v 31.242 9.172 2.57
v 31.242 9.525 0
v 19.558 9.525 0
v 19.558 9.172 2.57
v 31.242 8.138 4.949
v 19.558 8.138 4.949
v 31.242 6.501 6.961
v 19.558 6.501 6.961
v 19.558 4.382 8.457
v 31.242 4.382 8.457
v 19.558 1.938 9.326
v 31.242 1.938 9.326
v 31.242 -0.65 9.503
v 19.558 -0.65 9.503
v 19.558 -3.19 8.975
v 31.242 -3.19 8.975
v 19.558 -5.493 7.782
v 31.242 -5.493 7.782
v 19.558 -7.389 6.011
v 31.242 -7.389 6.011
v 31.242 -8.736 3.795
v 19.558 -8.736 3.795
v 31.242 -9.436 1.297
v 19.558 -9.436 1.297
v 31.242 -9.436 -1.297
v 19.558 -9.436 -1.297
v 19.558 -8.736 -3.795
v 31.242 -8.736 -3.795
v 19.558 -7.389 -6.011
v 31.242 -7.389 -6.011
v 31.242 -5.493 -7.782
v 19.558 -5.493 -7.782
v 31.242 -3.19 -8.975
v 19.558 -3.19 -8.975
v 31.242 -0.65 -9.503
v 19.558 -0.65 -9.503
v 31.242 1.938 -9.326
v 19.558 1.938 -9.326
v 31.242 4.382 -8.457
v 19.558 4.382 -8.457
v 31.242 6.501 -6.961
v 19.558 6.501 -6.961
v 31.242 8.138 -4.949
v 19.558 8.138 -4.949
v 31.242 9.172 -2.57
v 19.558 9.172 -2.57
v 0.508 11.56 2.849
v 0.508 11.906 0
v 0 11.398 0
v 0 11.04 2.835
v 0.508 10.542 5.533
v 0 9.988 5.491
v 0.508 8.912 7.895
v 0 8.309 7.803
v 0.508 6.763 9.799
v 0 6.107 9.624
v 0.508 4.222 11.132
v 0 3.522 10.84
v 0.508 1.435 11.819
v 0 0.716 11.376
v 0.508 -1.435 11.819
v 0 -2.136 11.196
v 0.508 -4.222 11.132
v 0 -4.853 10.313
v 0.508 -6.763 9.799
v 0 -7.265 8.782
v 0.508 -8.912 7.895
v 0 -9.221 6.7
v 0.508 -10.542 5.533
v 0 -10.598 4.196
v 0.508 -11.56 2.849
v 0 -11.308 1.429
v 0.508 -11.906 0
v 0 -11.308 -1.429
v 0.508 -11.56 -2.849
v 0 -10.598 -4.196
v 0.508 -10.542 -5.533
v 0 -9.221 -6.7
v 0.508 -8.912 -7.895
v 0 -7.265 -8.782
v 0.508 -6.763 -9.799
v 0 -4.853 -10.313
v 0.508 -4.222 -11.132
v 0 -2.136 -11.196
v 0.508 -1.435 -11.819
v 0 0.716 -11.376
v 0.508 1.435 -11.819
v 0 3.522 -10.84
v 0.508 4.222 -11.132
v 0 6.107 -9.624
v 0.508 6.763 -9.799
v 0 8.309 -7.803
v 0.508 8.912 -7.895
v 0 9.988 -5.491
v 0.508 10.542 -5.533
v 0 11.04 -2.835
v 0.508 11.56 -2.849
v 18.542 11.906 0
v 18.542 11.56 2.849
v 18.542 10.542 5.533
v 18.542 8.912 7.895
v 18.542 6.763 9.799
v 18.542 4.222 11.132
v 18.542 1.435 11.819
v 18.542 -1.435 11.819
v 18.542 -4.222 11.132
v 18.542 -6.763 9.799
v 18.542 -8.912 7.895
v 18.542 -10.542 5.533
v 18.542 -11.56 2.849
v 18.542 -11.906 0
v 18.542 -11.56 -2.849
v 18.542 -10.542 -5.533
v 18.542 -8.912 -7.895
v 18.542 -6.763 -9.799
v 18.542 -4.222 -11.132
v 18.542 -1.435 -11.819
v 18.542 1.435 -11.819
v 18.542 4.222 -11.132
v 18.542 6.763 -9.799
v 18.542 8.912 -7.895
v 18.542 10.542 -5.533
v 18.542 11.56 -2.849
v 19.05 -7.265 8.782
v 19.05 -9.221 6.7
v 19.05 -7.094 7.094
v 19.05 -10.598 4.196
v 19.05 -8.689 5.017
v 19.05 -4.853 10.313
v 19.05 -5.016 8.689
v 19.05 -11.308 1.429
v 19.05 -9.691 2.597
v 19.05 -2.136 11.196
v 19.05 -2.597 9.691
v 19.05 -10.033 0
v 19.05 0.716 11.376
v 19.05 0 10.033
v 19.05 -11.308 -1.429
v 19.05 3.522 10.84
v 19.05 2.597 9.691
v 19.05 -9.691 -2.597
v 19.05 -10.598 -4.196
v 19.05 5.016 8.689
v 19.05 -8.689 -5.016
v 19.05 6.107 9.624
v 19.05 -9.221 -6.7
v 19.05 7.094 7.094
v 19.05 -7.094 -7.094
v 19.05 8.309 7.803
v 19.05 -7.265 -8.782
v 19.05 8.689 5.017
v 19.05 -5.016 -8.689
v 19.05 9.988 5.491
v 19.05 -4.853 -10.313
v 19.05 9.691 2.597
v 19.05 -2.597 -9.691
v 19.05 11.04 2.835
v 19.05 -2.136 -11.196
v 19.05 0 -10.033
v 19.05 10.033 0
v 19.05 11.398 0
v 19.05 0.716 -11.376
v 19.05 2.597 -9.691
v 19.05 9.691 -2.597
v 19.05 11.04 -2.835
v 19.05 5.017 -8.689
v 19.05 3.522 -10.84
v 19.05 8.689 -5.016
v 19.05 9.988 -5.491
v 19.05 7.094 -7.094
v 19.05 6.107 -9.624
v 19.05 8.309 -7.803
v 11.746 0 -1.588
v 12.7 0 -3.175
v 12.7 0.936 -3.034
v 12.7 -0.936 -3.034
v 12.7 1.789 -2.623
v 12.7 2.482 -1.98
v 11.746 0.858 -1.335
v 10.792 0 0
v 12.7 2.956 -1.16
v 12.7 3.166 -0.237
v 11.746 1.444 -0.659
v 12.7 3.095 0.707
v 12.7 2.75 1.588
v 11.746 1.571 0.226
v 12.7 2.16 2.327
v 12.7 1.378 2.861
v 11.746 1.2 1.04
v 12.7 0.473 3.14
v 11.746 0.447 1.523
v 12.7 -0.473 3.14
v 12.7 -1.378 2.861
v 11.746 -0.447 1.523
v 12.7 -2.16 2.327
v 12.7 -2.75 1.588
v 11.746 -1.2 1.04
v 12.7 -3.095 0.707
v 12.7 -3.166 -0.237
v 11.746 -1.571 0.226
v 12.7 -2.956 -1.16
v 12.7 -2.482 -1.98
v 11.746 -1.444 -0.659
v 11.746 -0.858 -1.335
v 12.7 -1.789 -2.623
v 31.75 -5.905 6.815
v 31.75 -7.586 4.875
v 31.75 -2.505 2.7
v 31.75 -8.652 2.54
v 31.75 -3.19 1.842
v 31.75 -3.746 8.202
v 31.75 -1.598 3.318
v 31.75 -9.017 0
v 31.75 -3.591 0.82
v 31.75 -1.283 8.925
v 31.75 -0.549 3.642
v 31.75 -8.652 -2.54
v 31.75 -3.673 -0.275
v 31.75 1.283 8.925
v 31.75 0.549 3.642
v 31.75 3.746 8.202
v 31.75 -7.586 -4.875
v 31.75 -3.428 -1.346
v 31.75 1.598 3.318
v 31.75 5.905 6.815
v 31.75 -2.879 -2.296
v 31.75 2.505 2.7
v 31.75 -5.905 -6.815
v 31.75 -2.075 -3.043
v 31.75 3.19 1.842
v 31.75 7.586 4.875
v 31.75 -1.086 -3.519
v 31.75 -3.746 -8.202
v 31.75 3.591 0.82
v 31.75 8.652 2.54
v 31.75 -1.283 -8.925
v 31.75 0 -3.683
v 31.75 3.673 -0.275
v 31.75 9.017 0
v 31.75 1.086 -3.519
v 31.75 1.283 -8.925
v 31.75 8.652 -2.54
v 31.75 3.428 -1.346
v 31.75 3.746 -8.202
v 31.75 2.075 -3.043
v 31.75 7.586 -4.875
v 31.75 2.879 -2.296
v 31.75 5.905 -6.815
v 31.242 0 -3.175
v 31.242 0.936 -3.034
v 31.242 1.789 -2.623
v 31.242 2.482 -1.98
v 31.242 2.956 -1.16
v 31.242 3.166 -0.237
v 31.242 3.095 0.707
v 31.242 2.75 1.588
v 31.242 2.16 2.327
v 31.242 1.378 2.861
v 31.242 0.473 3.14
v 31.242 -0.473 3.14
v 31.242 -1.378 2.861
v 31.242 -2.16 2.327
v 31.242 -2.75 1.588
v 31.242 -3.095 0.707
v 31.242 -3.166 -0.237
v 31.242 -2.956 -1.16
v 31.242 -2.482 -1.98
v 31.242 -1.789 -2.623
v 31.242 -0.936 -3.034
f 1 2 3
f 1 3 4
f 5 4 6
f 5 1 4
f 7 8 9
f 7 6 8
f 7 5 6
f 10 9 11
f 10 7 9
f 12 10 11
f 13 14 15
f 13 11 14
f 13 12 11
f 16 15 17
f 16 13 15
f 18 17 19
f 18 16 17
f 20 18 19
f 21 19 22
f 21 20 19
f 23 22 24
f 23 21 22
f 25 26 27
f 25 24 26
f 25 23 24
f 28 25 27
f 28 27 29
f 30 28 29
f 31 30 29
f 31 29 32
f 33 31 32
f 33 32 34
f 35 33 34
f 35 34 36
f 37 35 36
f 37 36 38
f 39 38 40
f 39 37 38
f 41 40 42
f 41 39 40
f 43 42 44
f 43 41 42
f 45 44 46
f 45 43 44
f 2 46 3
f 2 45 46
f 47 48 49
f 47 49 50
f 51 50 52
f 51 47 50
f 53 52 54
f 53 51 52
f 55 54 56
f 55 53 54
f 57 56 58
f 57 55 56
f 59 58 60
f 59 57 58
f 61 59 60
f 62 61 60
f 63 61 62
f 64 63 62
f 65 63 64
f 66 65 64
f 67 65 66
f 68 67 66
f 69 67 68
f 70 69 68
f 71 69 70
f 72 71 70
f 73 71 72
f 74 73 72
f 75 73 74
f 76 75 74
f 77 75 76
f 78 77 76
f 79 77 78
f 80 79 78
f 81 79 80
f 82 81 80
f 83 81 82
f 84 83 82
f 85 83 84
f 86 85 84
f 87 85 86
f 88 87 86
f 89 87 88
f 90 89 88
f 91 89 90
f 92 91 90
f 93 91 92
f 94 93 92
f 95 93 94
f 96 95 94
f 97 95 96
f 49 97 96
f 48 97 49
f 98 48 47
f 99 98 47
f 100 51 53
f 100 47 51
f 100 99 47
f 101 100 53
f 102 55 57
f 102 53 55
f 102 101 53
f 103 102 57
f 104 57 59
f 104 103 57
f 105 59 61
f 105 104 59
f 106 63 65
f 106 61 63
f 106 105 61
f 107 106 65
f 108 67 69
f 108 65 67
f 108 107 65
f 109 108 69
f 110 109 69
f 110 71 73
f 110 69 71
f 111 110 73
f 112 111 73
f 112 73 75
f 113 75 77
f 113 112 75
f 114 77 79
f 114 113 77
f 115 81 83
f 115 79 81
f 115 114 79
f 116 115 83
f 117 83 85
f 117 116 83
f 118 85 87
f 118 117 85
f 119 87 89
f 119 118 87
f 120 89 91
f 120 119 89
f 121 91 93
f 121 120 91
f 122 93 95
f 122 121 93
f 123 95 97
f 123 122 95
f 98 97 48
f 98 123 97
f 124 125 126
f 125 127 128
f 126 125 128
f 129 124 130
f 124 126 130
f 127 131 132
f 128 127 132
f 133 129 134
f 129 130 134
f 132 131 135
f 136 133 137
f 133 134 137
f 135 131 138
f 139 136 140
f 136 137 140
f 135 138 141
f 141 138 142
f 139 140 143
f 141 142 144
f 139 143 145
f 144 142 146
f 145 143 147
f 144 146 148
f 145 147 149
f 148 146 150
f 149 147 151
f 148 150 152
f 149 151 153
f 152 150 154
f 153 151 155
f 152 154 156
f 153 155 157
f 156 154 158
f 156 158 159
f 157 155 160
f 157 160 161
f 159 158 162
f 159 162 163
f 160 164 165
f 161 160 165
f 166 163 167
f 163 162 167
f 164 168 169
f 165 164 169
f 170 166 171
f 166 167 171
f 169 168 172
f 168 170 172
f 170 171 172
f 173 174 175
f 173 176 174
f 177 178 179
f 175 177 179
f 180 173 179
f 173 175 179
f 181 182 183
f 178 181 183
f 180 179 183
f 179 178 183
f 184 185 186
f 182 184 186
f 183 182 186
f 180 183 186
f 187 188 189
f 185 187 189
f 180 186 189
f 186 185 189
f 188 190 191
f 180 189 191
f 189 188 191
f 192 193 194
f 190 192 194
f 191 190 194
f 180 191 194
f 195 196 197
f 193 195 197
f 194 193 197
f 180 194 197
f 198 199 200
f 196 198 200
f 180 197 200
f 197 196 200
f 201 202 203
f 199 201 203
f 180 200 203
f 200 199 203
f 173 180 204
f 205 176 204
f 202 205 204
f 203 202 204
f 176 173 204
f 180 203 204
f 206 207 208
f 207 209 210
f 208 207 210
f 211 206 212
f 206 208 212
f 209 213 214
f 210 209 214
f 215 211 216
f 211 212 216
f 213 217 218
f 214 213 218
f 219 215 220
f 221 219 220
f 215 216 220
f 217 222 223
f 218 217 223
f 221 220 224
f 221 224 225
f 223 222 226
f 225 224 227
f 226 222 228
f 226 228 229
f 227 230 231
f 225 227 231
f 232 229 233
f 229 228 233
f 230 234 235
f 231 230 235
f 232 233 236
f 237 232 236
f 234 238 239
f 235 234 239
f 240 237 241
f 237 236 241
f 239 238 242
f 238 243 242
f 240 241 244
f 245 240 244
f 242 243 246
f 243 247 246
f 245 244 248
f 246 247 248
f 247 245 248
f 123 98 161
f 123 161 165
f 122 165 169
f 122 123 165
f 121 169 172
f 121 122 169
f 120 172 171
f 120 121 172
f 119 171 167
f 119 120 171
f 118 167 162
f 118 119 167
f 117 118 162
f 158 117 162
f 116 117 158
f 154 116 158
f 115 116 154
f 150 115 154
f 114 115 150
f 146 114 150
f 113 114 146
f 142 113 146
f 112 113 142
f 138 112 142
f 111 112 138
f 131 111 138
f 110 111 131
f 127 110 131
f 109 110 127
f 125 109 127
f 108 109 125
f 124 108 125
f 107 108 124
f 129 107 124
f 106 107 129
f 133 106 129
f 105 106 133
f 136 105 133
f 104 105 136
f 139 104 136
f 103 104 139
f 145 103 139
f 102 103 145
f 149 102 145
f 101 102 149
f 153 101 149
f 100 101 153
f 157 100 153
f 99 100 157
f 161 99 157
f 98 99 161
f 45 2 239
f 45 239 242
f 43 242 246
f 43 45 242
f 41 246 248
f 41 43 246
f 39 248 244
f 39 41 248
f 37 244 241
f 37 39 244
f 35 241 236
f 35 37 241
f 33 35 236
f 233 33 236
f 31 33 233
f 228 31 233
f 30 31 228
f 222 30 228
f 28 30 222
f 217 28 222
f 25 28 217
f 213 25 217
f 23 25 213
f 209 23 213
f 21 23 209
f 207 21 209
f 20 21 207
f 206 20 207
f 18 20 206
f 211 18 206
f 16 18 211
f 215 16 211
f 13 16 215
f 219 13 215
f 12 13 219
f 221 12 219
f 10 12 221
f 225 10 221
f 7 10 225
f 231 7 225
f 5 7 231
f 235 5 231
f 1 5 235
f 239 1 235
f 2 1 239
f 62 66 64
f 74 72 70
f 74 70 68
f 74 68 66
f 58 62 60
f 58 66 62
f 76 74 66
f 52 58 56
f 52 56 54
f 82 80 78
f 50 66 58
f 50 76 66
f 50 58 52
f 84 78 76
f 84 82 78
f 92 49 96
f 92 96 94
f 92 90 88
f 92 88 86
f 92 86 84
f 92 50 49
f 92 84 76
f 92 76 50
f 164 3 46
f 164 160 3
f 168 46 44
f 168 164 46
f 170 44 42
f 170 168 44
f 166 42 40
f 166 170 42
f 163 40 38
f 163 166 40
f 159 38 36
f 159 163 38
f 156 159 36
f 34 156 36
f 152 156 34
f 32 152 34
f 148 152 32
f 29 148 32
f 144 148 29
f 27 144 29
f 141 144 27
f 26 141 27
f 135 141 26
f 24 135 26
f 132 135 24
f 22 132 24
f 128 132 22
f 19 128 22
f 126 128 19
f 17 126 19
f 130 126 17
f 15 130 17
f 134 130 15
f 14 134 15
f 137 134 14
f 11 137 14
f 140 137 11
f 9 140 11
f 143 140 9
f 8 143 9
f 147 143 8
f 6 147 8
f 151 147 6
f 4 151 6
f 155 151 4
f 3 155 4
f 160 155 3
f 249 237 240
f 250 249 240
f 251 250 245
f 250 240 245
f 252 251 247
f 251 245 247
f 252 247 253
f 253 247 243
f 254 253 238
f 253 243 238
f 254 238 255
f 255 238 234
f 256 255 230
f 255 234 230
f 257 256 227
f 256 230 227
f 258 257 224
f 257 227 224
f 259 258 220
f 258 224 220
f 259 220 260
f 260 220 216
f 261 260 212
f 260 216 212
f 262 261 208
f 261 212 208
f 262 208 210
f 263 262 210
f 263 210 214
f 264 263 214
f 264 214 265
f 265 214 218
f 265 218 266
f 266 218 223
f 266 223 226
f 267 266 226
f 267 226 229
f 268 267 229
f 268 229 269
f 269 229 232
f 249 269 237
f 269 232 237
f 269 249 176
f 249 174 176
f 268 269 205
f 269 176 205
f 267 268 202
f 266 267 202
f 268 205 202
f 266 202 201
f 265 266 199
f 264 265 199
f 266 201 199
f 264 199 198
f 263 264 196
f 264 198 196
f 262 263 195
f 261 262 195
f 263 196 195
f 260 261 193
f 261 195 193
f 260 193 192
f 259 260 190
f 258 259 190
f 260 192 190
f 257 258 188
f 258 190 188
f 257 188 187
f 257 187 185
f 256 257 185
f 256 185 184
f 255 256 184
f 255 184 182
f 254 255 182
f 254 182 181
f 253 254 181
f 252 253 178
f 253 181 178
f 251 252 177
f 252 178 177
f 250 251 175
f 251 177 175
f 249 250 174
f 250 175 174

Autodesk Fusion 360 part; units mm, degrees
sketch "Sketch1" plane through (0, 0, 0) normal (0, 0, 1) x (1, 0, 0)
  line L0 (0, 0) -> (0, 11.9062)
  line L1 (0, 11.9062) -> (19.05, 11.9063)
  line L2 (19.05, 11.9063) -> (19.05, 9.525)
  line L3 (19.05, 9.525) -> (31.75, 9.525)
  line L4 (31.75, 9.525) -> (31.75, 0)
  line L5 (31.75, 0) -> (0, 0)
  dimension "d1" = 11.9062
  dimension "d2" = 9.525
  dimension "d3" = 12.7
  dimension "d4" = 19.05
revolve "Revolve1" add sketch "Sketch1" angle 360 about axis through (31.75, 0, 0) along (-1, 0, 0)
hole "Hole1" at (31.75, 0, 0) direction (-1, 0, 0) diameter 6.35 depth 19.05 tip angle 118
chamfer "Chamfer1" distance 0.508 angle 45 5 edges at (0, -4.3055, 11.1005) (19.05, -4.3055, 11.1005) (19.05, -3.4444, 8.8804) (31.75, -3.4444, 8.8804) (31.75, -2.9601, 1.1481)
equation "d1 = ( 15 / 32 ) * 1 in"
